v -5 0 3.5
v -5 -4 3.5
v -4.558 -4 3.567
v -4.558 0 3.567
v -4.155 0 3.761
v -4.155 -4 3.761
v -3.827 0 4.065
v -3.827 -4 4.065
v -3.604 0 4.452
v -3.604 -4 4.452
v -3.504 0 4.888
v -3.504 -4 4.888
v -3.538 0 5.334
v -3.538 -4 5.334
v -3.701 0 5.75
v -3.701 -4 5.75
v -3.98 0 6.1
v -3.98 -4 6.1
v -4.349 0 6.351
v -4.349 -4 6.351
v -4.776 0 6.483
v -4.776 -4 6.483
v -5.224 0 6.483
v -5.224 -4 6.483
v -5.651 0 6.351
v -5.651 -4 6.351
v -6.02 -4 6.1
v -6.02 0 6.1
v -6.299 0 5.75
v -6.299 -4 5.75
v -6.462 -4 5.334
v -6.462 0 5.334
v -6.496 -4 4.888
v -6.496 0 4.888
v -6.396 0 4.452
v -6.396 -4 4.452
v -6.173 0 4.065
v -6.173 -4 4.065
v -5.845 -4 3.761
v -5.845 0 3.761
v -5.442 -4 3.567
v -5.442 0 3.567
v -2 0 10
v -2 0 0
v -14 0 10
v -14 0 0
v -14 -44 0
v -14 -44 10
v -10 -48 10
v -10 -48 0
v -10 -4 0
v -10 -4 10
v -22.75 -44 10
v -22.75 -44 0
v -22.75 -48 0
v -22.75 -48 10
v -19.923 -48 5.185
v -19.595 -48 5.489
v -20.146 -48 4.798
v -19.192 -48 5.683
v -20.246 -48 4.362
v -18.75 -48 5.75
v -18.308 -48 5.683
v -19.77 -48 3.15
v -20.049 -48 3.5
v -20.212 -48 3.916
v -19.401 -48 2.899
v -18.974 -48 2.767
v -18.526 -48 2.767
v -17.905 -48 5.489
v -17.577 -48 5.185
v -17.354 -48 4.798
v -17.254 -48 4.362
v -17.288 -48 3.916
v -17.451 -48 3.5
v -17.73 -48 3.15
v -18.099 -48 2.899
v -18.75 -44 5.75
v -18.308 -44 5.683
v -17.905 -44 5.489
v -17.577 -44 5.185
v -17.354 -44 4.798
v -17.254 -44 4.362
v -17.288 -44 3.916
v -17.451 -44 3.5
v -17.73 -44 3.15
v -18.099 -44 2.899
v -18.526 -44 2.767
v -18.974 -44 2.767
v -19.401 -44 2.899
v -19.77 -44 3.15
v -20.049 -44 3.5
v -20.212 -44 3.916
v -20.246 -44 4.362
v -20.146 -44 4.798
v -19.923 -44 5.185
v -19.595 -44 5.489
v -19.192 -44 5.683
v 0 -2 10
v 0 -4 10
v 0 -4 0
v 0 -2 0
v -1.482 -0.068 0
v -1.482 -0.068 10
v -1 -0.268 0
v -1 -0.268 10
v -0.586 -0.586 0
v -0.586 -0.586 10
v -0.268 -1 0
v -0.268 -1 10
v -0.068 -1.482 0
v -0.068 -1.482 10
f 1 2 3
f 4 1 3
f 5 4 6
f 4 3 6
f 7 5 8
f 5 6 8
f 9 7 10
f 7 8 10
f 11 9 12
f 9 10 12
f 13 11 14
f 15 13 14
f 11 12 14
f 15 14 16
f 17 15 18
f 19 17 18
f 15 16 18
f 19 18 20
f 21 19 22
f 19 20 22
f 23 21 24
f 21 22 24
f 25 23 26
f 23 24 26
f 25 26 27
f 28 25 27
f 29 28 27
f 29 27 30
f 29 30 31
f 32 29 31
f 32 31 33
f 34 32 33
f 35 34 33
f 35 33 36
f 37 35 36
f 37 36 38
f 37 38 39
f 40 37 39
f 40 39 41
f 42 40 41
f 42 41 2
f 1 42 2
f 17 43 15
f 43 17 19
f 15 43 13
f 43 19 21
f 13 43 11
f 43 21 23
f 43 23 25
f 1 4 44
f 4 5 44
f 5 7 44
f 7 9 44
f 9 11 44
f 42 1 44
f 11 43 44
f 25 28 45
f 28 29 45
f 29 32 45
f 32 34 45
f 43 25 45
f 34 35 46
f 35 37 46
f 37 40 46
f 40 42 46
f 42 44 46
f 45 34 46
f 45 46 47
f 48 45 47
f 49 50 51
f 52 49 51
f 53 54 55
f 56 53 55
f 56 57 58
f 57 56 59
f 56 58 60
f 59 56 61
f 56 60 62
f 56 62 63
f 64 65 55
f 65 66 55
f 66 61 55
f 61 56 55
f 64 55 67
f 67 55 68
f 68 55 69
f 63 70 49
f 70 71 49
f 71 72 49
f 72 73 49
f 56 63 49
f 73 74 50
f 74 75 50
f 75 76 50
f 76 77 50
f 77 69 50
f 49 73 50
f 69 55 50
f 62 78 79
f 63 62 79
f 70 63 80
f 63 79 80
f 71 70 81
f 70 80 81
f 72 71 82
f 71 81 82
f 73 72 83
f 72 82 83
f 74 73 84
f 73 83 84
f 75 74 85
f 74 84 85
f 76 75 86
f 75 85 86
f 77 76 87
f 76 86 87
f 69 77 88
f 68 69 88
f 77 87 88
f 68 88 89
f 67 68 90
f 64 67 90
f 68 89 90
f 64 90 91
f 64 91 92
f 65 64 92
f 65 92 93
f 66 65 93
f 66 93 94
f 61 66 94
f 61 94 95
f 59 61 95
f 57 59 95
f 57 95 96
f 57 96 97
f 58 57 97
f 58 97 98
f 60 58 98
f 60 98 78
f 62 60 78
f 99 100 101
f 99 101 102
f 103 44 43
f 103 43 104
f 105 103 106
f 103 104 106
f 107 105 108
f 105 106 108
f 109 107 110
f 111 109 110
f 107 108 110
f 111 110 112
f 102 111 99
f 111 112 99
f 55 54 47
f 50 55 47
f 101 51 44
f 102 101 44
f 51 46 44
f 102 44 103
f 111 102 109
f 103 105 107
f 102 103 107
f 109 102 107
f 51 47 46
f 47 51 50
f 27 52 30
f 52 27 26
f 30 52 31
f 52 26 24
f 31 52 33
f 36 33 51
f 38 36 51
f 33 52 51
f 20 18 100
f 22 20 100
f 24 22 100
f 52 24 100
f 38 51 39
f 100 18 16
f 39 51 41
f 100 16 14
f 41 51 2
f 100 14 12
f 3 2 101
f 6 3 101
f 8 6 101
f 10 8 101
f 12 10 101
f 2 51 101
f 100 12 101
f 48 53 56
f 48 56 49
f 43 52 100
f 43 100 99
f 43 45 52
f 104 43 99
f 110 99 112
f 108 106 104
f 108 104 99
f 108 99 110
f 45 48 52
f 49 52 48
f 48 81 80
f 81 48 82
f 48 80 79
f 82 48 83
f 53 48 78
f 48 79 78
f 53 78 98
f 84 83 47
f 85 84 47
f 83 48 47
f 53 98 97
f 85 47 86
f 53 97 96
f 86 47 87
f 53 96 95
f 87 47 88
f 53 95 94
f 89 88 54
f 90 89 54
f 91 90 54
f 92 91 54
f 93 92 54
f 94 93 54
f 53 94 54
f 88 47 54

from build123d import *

# Parameters (mm, degrees)
BOSS_EXTRUDE1_DEPTH = 10
SKETCH2_R           = 1.5
CUT_EXTRUDE1_DEPTH  = 10
SKETCH3_R           = 1.5
CUT_EXTRUDE2_DEPTH  = 10
FILLET1_R           = 2


with BuildPart() as part:
    # Sketch1 → Boss-Extrude1 (new body)
    with BuildSketch(Plane.XY):
        Polygon((0, 0), (-14, 0), (-14, -44), (-22.75, -44), (-22.75, -48), (-10, -48), (-10, -4), (0, -4), align=None)
    extrude(amount=BOSS_EXTRUDE1_DEPTH)

    # Sketch2 → Cut-Extrude1 (cut)
    with BuildSketch(Plane(origin=(0, -44, 0), x_dir=(1, 0, 0), z_dir=(0, 1, 0))):
        with Locations(Location((-18.75, -4.25, 0), (0, 0, 270))):
            Circle(SKETCH2_R)
    extrude(amount=-CUT_EXTRUDE1_DEPTH, mode=Mode.SUBTRACT)

    # Sketch3 → Cut-Extrude2 (cut)
    with BuildSketch(Plane(origin=(0, -4, 0), x_dir=(-1, 0, 0), z_dir=(0, -1, 0))):
        with Locations(Location((5, -5, 0), (0, 0, 90))):
            Circle(SKETCH3_R)
    extrude(amount=-CUT_EXTRUDE2_DEPTH, mode=Mode.SUBTRACT)

    # Fillet1
    fillet1_edges = [part.edges().sort_by_distance(p)[0] for p in [
        (0, 0, 5),
    ]]
    fillet(fillet1_edges, radius=FILLET1_R)


solid = part.part
